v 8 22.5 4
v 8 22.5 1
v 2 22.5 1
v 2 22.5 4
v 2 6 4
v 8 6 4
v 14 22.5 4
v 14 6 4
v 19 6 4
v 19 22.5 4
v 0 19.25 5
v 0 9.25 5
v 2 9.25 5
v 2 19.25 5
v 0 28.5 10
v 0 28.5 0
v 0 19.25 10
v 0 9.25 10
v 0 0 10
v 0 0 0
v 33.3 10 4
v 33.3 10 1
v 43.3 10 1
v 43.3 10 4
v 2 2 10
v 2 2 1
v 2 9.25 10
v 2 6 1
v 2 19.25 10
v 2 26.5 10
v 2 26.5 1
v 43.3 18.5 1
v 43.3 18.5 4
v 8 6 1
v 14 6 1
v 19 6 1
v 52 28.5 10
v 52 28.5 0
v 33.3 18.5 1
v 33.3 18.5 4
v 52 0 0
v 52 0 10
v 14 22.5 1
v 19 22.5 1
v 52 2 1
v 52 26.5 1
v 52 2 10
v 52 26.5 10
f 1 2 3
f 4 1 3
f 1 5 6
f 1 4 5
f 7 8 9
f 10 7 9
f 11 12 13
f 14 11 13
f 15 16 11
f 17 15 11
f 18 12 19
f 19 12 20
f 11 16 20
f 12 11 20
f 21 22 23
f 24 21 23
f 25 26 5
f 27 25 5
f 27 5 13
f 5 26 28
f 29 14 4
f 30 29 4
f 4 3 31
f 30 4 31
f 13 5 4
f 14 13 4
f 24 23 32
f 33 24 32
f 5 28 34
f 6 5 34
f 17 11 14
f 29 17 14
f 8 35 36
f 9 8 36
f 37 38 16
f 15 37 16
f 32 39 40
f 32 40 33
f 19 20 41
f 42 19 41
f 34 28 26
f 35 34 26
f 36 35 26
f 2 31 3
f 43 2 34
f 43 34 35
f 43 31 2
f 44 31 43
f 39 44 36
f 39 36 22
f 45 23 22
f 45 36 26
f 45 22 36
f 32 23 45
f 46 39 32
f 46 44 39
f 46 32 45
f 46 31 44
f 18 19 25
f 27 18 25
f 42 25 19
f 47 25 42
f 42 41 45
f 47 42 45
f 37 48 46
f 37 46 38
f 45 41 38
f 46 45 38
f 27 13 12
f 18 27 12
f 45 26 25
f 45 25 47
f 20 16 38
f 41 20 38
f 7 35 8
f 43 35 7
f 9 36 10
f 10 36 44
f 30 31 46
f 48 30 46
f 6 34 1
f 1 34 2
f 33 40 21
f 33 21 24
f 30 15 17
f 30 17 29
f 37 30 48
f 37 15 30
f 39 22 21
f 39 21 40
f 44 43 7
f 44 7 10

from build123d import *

# Parameters (mm, degrees)
F0_W     = 5
F0_H     = 16.5
F0_W_2   = 10
F0_H_2   = 8.5
F1_DEPTH = 1
F2_DEPTH = 4
F0_W_3   = 2
F0_H_3   = 10
F3_DEPTH = 5
F0_W_4   = 50
F0_H_4   = 2
F4_DEPTH = 10


# Not quite as in the source:
# - a feature names something its author has since deleted; it is built from what else it names


with BuildPart() as f1:
    # F0 (on Top) → F1 (new body)
    with BuildSketch(Plane.XY):
        Polygon((2, 6), (2, 2), (52, 2), (52, 6), (52, 26.5), (2, 26.5), (2, 22.5), (8, 22.5), (8, 6), align=None)
        with Locations((16.5, 14.25)):
            Rectangle(F0_W, F0_H, mode=Mode.SUBTRACT)
        with Locations((38.3, 14.25)):
            Rectangle(F0_W_2, F0_H_2, mode=Mode.SUBTRACT)
    extrude(amount=F1_DEPTH)

    # F0 (on Top) → F2 (join)
    with BuildSketch(Plane.XY):
        Polygon((2, 19.25), (2, 9.25), (2, 6), (8, 6), (8, 22.5), (2, 22.5), align=None)
        with Locations((16.5, 14.25)):
            Rectangle(F0_W, F0_H)
        with Locations((38.3, 14.25)):
            Rectangle(F0_W_2, F0_H_2)
    extrude(amount=F2_DEPTH)

    # F0 (on Top) → F3 (join)
    with BuildSketch(Plane.XY):
        with Locations((1, 14.25)):
            Rectangle(F0_W_3, F0_H_3)
    extrude(amount=F3_DEPTH)

    # F0 (on Top) → F4 (join)
    with BuildSketch(Plane.XY):
        with Locations((27, 27.5)):
            Rectangle(F0_W_4, F0_H_4)
        Polygon((0, 28.5), (0, 19.25), (2, 19.25), (2, 22.5), (2, 26.5), (2, 28.5), align=None)
        Polygon((0, 9.25), (0, 0), (2, 0), (2, 2), (2, 6), (2, 9.25), align=None)
        with Locations((27, 1)):
            Rectangle(F0_W_4, F0_H_4)
    extrude(amount=F4_DEPTH)


solid = f1.part
